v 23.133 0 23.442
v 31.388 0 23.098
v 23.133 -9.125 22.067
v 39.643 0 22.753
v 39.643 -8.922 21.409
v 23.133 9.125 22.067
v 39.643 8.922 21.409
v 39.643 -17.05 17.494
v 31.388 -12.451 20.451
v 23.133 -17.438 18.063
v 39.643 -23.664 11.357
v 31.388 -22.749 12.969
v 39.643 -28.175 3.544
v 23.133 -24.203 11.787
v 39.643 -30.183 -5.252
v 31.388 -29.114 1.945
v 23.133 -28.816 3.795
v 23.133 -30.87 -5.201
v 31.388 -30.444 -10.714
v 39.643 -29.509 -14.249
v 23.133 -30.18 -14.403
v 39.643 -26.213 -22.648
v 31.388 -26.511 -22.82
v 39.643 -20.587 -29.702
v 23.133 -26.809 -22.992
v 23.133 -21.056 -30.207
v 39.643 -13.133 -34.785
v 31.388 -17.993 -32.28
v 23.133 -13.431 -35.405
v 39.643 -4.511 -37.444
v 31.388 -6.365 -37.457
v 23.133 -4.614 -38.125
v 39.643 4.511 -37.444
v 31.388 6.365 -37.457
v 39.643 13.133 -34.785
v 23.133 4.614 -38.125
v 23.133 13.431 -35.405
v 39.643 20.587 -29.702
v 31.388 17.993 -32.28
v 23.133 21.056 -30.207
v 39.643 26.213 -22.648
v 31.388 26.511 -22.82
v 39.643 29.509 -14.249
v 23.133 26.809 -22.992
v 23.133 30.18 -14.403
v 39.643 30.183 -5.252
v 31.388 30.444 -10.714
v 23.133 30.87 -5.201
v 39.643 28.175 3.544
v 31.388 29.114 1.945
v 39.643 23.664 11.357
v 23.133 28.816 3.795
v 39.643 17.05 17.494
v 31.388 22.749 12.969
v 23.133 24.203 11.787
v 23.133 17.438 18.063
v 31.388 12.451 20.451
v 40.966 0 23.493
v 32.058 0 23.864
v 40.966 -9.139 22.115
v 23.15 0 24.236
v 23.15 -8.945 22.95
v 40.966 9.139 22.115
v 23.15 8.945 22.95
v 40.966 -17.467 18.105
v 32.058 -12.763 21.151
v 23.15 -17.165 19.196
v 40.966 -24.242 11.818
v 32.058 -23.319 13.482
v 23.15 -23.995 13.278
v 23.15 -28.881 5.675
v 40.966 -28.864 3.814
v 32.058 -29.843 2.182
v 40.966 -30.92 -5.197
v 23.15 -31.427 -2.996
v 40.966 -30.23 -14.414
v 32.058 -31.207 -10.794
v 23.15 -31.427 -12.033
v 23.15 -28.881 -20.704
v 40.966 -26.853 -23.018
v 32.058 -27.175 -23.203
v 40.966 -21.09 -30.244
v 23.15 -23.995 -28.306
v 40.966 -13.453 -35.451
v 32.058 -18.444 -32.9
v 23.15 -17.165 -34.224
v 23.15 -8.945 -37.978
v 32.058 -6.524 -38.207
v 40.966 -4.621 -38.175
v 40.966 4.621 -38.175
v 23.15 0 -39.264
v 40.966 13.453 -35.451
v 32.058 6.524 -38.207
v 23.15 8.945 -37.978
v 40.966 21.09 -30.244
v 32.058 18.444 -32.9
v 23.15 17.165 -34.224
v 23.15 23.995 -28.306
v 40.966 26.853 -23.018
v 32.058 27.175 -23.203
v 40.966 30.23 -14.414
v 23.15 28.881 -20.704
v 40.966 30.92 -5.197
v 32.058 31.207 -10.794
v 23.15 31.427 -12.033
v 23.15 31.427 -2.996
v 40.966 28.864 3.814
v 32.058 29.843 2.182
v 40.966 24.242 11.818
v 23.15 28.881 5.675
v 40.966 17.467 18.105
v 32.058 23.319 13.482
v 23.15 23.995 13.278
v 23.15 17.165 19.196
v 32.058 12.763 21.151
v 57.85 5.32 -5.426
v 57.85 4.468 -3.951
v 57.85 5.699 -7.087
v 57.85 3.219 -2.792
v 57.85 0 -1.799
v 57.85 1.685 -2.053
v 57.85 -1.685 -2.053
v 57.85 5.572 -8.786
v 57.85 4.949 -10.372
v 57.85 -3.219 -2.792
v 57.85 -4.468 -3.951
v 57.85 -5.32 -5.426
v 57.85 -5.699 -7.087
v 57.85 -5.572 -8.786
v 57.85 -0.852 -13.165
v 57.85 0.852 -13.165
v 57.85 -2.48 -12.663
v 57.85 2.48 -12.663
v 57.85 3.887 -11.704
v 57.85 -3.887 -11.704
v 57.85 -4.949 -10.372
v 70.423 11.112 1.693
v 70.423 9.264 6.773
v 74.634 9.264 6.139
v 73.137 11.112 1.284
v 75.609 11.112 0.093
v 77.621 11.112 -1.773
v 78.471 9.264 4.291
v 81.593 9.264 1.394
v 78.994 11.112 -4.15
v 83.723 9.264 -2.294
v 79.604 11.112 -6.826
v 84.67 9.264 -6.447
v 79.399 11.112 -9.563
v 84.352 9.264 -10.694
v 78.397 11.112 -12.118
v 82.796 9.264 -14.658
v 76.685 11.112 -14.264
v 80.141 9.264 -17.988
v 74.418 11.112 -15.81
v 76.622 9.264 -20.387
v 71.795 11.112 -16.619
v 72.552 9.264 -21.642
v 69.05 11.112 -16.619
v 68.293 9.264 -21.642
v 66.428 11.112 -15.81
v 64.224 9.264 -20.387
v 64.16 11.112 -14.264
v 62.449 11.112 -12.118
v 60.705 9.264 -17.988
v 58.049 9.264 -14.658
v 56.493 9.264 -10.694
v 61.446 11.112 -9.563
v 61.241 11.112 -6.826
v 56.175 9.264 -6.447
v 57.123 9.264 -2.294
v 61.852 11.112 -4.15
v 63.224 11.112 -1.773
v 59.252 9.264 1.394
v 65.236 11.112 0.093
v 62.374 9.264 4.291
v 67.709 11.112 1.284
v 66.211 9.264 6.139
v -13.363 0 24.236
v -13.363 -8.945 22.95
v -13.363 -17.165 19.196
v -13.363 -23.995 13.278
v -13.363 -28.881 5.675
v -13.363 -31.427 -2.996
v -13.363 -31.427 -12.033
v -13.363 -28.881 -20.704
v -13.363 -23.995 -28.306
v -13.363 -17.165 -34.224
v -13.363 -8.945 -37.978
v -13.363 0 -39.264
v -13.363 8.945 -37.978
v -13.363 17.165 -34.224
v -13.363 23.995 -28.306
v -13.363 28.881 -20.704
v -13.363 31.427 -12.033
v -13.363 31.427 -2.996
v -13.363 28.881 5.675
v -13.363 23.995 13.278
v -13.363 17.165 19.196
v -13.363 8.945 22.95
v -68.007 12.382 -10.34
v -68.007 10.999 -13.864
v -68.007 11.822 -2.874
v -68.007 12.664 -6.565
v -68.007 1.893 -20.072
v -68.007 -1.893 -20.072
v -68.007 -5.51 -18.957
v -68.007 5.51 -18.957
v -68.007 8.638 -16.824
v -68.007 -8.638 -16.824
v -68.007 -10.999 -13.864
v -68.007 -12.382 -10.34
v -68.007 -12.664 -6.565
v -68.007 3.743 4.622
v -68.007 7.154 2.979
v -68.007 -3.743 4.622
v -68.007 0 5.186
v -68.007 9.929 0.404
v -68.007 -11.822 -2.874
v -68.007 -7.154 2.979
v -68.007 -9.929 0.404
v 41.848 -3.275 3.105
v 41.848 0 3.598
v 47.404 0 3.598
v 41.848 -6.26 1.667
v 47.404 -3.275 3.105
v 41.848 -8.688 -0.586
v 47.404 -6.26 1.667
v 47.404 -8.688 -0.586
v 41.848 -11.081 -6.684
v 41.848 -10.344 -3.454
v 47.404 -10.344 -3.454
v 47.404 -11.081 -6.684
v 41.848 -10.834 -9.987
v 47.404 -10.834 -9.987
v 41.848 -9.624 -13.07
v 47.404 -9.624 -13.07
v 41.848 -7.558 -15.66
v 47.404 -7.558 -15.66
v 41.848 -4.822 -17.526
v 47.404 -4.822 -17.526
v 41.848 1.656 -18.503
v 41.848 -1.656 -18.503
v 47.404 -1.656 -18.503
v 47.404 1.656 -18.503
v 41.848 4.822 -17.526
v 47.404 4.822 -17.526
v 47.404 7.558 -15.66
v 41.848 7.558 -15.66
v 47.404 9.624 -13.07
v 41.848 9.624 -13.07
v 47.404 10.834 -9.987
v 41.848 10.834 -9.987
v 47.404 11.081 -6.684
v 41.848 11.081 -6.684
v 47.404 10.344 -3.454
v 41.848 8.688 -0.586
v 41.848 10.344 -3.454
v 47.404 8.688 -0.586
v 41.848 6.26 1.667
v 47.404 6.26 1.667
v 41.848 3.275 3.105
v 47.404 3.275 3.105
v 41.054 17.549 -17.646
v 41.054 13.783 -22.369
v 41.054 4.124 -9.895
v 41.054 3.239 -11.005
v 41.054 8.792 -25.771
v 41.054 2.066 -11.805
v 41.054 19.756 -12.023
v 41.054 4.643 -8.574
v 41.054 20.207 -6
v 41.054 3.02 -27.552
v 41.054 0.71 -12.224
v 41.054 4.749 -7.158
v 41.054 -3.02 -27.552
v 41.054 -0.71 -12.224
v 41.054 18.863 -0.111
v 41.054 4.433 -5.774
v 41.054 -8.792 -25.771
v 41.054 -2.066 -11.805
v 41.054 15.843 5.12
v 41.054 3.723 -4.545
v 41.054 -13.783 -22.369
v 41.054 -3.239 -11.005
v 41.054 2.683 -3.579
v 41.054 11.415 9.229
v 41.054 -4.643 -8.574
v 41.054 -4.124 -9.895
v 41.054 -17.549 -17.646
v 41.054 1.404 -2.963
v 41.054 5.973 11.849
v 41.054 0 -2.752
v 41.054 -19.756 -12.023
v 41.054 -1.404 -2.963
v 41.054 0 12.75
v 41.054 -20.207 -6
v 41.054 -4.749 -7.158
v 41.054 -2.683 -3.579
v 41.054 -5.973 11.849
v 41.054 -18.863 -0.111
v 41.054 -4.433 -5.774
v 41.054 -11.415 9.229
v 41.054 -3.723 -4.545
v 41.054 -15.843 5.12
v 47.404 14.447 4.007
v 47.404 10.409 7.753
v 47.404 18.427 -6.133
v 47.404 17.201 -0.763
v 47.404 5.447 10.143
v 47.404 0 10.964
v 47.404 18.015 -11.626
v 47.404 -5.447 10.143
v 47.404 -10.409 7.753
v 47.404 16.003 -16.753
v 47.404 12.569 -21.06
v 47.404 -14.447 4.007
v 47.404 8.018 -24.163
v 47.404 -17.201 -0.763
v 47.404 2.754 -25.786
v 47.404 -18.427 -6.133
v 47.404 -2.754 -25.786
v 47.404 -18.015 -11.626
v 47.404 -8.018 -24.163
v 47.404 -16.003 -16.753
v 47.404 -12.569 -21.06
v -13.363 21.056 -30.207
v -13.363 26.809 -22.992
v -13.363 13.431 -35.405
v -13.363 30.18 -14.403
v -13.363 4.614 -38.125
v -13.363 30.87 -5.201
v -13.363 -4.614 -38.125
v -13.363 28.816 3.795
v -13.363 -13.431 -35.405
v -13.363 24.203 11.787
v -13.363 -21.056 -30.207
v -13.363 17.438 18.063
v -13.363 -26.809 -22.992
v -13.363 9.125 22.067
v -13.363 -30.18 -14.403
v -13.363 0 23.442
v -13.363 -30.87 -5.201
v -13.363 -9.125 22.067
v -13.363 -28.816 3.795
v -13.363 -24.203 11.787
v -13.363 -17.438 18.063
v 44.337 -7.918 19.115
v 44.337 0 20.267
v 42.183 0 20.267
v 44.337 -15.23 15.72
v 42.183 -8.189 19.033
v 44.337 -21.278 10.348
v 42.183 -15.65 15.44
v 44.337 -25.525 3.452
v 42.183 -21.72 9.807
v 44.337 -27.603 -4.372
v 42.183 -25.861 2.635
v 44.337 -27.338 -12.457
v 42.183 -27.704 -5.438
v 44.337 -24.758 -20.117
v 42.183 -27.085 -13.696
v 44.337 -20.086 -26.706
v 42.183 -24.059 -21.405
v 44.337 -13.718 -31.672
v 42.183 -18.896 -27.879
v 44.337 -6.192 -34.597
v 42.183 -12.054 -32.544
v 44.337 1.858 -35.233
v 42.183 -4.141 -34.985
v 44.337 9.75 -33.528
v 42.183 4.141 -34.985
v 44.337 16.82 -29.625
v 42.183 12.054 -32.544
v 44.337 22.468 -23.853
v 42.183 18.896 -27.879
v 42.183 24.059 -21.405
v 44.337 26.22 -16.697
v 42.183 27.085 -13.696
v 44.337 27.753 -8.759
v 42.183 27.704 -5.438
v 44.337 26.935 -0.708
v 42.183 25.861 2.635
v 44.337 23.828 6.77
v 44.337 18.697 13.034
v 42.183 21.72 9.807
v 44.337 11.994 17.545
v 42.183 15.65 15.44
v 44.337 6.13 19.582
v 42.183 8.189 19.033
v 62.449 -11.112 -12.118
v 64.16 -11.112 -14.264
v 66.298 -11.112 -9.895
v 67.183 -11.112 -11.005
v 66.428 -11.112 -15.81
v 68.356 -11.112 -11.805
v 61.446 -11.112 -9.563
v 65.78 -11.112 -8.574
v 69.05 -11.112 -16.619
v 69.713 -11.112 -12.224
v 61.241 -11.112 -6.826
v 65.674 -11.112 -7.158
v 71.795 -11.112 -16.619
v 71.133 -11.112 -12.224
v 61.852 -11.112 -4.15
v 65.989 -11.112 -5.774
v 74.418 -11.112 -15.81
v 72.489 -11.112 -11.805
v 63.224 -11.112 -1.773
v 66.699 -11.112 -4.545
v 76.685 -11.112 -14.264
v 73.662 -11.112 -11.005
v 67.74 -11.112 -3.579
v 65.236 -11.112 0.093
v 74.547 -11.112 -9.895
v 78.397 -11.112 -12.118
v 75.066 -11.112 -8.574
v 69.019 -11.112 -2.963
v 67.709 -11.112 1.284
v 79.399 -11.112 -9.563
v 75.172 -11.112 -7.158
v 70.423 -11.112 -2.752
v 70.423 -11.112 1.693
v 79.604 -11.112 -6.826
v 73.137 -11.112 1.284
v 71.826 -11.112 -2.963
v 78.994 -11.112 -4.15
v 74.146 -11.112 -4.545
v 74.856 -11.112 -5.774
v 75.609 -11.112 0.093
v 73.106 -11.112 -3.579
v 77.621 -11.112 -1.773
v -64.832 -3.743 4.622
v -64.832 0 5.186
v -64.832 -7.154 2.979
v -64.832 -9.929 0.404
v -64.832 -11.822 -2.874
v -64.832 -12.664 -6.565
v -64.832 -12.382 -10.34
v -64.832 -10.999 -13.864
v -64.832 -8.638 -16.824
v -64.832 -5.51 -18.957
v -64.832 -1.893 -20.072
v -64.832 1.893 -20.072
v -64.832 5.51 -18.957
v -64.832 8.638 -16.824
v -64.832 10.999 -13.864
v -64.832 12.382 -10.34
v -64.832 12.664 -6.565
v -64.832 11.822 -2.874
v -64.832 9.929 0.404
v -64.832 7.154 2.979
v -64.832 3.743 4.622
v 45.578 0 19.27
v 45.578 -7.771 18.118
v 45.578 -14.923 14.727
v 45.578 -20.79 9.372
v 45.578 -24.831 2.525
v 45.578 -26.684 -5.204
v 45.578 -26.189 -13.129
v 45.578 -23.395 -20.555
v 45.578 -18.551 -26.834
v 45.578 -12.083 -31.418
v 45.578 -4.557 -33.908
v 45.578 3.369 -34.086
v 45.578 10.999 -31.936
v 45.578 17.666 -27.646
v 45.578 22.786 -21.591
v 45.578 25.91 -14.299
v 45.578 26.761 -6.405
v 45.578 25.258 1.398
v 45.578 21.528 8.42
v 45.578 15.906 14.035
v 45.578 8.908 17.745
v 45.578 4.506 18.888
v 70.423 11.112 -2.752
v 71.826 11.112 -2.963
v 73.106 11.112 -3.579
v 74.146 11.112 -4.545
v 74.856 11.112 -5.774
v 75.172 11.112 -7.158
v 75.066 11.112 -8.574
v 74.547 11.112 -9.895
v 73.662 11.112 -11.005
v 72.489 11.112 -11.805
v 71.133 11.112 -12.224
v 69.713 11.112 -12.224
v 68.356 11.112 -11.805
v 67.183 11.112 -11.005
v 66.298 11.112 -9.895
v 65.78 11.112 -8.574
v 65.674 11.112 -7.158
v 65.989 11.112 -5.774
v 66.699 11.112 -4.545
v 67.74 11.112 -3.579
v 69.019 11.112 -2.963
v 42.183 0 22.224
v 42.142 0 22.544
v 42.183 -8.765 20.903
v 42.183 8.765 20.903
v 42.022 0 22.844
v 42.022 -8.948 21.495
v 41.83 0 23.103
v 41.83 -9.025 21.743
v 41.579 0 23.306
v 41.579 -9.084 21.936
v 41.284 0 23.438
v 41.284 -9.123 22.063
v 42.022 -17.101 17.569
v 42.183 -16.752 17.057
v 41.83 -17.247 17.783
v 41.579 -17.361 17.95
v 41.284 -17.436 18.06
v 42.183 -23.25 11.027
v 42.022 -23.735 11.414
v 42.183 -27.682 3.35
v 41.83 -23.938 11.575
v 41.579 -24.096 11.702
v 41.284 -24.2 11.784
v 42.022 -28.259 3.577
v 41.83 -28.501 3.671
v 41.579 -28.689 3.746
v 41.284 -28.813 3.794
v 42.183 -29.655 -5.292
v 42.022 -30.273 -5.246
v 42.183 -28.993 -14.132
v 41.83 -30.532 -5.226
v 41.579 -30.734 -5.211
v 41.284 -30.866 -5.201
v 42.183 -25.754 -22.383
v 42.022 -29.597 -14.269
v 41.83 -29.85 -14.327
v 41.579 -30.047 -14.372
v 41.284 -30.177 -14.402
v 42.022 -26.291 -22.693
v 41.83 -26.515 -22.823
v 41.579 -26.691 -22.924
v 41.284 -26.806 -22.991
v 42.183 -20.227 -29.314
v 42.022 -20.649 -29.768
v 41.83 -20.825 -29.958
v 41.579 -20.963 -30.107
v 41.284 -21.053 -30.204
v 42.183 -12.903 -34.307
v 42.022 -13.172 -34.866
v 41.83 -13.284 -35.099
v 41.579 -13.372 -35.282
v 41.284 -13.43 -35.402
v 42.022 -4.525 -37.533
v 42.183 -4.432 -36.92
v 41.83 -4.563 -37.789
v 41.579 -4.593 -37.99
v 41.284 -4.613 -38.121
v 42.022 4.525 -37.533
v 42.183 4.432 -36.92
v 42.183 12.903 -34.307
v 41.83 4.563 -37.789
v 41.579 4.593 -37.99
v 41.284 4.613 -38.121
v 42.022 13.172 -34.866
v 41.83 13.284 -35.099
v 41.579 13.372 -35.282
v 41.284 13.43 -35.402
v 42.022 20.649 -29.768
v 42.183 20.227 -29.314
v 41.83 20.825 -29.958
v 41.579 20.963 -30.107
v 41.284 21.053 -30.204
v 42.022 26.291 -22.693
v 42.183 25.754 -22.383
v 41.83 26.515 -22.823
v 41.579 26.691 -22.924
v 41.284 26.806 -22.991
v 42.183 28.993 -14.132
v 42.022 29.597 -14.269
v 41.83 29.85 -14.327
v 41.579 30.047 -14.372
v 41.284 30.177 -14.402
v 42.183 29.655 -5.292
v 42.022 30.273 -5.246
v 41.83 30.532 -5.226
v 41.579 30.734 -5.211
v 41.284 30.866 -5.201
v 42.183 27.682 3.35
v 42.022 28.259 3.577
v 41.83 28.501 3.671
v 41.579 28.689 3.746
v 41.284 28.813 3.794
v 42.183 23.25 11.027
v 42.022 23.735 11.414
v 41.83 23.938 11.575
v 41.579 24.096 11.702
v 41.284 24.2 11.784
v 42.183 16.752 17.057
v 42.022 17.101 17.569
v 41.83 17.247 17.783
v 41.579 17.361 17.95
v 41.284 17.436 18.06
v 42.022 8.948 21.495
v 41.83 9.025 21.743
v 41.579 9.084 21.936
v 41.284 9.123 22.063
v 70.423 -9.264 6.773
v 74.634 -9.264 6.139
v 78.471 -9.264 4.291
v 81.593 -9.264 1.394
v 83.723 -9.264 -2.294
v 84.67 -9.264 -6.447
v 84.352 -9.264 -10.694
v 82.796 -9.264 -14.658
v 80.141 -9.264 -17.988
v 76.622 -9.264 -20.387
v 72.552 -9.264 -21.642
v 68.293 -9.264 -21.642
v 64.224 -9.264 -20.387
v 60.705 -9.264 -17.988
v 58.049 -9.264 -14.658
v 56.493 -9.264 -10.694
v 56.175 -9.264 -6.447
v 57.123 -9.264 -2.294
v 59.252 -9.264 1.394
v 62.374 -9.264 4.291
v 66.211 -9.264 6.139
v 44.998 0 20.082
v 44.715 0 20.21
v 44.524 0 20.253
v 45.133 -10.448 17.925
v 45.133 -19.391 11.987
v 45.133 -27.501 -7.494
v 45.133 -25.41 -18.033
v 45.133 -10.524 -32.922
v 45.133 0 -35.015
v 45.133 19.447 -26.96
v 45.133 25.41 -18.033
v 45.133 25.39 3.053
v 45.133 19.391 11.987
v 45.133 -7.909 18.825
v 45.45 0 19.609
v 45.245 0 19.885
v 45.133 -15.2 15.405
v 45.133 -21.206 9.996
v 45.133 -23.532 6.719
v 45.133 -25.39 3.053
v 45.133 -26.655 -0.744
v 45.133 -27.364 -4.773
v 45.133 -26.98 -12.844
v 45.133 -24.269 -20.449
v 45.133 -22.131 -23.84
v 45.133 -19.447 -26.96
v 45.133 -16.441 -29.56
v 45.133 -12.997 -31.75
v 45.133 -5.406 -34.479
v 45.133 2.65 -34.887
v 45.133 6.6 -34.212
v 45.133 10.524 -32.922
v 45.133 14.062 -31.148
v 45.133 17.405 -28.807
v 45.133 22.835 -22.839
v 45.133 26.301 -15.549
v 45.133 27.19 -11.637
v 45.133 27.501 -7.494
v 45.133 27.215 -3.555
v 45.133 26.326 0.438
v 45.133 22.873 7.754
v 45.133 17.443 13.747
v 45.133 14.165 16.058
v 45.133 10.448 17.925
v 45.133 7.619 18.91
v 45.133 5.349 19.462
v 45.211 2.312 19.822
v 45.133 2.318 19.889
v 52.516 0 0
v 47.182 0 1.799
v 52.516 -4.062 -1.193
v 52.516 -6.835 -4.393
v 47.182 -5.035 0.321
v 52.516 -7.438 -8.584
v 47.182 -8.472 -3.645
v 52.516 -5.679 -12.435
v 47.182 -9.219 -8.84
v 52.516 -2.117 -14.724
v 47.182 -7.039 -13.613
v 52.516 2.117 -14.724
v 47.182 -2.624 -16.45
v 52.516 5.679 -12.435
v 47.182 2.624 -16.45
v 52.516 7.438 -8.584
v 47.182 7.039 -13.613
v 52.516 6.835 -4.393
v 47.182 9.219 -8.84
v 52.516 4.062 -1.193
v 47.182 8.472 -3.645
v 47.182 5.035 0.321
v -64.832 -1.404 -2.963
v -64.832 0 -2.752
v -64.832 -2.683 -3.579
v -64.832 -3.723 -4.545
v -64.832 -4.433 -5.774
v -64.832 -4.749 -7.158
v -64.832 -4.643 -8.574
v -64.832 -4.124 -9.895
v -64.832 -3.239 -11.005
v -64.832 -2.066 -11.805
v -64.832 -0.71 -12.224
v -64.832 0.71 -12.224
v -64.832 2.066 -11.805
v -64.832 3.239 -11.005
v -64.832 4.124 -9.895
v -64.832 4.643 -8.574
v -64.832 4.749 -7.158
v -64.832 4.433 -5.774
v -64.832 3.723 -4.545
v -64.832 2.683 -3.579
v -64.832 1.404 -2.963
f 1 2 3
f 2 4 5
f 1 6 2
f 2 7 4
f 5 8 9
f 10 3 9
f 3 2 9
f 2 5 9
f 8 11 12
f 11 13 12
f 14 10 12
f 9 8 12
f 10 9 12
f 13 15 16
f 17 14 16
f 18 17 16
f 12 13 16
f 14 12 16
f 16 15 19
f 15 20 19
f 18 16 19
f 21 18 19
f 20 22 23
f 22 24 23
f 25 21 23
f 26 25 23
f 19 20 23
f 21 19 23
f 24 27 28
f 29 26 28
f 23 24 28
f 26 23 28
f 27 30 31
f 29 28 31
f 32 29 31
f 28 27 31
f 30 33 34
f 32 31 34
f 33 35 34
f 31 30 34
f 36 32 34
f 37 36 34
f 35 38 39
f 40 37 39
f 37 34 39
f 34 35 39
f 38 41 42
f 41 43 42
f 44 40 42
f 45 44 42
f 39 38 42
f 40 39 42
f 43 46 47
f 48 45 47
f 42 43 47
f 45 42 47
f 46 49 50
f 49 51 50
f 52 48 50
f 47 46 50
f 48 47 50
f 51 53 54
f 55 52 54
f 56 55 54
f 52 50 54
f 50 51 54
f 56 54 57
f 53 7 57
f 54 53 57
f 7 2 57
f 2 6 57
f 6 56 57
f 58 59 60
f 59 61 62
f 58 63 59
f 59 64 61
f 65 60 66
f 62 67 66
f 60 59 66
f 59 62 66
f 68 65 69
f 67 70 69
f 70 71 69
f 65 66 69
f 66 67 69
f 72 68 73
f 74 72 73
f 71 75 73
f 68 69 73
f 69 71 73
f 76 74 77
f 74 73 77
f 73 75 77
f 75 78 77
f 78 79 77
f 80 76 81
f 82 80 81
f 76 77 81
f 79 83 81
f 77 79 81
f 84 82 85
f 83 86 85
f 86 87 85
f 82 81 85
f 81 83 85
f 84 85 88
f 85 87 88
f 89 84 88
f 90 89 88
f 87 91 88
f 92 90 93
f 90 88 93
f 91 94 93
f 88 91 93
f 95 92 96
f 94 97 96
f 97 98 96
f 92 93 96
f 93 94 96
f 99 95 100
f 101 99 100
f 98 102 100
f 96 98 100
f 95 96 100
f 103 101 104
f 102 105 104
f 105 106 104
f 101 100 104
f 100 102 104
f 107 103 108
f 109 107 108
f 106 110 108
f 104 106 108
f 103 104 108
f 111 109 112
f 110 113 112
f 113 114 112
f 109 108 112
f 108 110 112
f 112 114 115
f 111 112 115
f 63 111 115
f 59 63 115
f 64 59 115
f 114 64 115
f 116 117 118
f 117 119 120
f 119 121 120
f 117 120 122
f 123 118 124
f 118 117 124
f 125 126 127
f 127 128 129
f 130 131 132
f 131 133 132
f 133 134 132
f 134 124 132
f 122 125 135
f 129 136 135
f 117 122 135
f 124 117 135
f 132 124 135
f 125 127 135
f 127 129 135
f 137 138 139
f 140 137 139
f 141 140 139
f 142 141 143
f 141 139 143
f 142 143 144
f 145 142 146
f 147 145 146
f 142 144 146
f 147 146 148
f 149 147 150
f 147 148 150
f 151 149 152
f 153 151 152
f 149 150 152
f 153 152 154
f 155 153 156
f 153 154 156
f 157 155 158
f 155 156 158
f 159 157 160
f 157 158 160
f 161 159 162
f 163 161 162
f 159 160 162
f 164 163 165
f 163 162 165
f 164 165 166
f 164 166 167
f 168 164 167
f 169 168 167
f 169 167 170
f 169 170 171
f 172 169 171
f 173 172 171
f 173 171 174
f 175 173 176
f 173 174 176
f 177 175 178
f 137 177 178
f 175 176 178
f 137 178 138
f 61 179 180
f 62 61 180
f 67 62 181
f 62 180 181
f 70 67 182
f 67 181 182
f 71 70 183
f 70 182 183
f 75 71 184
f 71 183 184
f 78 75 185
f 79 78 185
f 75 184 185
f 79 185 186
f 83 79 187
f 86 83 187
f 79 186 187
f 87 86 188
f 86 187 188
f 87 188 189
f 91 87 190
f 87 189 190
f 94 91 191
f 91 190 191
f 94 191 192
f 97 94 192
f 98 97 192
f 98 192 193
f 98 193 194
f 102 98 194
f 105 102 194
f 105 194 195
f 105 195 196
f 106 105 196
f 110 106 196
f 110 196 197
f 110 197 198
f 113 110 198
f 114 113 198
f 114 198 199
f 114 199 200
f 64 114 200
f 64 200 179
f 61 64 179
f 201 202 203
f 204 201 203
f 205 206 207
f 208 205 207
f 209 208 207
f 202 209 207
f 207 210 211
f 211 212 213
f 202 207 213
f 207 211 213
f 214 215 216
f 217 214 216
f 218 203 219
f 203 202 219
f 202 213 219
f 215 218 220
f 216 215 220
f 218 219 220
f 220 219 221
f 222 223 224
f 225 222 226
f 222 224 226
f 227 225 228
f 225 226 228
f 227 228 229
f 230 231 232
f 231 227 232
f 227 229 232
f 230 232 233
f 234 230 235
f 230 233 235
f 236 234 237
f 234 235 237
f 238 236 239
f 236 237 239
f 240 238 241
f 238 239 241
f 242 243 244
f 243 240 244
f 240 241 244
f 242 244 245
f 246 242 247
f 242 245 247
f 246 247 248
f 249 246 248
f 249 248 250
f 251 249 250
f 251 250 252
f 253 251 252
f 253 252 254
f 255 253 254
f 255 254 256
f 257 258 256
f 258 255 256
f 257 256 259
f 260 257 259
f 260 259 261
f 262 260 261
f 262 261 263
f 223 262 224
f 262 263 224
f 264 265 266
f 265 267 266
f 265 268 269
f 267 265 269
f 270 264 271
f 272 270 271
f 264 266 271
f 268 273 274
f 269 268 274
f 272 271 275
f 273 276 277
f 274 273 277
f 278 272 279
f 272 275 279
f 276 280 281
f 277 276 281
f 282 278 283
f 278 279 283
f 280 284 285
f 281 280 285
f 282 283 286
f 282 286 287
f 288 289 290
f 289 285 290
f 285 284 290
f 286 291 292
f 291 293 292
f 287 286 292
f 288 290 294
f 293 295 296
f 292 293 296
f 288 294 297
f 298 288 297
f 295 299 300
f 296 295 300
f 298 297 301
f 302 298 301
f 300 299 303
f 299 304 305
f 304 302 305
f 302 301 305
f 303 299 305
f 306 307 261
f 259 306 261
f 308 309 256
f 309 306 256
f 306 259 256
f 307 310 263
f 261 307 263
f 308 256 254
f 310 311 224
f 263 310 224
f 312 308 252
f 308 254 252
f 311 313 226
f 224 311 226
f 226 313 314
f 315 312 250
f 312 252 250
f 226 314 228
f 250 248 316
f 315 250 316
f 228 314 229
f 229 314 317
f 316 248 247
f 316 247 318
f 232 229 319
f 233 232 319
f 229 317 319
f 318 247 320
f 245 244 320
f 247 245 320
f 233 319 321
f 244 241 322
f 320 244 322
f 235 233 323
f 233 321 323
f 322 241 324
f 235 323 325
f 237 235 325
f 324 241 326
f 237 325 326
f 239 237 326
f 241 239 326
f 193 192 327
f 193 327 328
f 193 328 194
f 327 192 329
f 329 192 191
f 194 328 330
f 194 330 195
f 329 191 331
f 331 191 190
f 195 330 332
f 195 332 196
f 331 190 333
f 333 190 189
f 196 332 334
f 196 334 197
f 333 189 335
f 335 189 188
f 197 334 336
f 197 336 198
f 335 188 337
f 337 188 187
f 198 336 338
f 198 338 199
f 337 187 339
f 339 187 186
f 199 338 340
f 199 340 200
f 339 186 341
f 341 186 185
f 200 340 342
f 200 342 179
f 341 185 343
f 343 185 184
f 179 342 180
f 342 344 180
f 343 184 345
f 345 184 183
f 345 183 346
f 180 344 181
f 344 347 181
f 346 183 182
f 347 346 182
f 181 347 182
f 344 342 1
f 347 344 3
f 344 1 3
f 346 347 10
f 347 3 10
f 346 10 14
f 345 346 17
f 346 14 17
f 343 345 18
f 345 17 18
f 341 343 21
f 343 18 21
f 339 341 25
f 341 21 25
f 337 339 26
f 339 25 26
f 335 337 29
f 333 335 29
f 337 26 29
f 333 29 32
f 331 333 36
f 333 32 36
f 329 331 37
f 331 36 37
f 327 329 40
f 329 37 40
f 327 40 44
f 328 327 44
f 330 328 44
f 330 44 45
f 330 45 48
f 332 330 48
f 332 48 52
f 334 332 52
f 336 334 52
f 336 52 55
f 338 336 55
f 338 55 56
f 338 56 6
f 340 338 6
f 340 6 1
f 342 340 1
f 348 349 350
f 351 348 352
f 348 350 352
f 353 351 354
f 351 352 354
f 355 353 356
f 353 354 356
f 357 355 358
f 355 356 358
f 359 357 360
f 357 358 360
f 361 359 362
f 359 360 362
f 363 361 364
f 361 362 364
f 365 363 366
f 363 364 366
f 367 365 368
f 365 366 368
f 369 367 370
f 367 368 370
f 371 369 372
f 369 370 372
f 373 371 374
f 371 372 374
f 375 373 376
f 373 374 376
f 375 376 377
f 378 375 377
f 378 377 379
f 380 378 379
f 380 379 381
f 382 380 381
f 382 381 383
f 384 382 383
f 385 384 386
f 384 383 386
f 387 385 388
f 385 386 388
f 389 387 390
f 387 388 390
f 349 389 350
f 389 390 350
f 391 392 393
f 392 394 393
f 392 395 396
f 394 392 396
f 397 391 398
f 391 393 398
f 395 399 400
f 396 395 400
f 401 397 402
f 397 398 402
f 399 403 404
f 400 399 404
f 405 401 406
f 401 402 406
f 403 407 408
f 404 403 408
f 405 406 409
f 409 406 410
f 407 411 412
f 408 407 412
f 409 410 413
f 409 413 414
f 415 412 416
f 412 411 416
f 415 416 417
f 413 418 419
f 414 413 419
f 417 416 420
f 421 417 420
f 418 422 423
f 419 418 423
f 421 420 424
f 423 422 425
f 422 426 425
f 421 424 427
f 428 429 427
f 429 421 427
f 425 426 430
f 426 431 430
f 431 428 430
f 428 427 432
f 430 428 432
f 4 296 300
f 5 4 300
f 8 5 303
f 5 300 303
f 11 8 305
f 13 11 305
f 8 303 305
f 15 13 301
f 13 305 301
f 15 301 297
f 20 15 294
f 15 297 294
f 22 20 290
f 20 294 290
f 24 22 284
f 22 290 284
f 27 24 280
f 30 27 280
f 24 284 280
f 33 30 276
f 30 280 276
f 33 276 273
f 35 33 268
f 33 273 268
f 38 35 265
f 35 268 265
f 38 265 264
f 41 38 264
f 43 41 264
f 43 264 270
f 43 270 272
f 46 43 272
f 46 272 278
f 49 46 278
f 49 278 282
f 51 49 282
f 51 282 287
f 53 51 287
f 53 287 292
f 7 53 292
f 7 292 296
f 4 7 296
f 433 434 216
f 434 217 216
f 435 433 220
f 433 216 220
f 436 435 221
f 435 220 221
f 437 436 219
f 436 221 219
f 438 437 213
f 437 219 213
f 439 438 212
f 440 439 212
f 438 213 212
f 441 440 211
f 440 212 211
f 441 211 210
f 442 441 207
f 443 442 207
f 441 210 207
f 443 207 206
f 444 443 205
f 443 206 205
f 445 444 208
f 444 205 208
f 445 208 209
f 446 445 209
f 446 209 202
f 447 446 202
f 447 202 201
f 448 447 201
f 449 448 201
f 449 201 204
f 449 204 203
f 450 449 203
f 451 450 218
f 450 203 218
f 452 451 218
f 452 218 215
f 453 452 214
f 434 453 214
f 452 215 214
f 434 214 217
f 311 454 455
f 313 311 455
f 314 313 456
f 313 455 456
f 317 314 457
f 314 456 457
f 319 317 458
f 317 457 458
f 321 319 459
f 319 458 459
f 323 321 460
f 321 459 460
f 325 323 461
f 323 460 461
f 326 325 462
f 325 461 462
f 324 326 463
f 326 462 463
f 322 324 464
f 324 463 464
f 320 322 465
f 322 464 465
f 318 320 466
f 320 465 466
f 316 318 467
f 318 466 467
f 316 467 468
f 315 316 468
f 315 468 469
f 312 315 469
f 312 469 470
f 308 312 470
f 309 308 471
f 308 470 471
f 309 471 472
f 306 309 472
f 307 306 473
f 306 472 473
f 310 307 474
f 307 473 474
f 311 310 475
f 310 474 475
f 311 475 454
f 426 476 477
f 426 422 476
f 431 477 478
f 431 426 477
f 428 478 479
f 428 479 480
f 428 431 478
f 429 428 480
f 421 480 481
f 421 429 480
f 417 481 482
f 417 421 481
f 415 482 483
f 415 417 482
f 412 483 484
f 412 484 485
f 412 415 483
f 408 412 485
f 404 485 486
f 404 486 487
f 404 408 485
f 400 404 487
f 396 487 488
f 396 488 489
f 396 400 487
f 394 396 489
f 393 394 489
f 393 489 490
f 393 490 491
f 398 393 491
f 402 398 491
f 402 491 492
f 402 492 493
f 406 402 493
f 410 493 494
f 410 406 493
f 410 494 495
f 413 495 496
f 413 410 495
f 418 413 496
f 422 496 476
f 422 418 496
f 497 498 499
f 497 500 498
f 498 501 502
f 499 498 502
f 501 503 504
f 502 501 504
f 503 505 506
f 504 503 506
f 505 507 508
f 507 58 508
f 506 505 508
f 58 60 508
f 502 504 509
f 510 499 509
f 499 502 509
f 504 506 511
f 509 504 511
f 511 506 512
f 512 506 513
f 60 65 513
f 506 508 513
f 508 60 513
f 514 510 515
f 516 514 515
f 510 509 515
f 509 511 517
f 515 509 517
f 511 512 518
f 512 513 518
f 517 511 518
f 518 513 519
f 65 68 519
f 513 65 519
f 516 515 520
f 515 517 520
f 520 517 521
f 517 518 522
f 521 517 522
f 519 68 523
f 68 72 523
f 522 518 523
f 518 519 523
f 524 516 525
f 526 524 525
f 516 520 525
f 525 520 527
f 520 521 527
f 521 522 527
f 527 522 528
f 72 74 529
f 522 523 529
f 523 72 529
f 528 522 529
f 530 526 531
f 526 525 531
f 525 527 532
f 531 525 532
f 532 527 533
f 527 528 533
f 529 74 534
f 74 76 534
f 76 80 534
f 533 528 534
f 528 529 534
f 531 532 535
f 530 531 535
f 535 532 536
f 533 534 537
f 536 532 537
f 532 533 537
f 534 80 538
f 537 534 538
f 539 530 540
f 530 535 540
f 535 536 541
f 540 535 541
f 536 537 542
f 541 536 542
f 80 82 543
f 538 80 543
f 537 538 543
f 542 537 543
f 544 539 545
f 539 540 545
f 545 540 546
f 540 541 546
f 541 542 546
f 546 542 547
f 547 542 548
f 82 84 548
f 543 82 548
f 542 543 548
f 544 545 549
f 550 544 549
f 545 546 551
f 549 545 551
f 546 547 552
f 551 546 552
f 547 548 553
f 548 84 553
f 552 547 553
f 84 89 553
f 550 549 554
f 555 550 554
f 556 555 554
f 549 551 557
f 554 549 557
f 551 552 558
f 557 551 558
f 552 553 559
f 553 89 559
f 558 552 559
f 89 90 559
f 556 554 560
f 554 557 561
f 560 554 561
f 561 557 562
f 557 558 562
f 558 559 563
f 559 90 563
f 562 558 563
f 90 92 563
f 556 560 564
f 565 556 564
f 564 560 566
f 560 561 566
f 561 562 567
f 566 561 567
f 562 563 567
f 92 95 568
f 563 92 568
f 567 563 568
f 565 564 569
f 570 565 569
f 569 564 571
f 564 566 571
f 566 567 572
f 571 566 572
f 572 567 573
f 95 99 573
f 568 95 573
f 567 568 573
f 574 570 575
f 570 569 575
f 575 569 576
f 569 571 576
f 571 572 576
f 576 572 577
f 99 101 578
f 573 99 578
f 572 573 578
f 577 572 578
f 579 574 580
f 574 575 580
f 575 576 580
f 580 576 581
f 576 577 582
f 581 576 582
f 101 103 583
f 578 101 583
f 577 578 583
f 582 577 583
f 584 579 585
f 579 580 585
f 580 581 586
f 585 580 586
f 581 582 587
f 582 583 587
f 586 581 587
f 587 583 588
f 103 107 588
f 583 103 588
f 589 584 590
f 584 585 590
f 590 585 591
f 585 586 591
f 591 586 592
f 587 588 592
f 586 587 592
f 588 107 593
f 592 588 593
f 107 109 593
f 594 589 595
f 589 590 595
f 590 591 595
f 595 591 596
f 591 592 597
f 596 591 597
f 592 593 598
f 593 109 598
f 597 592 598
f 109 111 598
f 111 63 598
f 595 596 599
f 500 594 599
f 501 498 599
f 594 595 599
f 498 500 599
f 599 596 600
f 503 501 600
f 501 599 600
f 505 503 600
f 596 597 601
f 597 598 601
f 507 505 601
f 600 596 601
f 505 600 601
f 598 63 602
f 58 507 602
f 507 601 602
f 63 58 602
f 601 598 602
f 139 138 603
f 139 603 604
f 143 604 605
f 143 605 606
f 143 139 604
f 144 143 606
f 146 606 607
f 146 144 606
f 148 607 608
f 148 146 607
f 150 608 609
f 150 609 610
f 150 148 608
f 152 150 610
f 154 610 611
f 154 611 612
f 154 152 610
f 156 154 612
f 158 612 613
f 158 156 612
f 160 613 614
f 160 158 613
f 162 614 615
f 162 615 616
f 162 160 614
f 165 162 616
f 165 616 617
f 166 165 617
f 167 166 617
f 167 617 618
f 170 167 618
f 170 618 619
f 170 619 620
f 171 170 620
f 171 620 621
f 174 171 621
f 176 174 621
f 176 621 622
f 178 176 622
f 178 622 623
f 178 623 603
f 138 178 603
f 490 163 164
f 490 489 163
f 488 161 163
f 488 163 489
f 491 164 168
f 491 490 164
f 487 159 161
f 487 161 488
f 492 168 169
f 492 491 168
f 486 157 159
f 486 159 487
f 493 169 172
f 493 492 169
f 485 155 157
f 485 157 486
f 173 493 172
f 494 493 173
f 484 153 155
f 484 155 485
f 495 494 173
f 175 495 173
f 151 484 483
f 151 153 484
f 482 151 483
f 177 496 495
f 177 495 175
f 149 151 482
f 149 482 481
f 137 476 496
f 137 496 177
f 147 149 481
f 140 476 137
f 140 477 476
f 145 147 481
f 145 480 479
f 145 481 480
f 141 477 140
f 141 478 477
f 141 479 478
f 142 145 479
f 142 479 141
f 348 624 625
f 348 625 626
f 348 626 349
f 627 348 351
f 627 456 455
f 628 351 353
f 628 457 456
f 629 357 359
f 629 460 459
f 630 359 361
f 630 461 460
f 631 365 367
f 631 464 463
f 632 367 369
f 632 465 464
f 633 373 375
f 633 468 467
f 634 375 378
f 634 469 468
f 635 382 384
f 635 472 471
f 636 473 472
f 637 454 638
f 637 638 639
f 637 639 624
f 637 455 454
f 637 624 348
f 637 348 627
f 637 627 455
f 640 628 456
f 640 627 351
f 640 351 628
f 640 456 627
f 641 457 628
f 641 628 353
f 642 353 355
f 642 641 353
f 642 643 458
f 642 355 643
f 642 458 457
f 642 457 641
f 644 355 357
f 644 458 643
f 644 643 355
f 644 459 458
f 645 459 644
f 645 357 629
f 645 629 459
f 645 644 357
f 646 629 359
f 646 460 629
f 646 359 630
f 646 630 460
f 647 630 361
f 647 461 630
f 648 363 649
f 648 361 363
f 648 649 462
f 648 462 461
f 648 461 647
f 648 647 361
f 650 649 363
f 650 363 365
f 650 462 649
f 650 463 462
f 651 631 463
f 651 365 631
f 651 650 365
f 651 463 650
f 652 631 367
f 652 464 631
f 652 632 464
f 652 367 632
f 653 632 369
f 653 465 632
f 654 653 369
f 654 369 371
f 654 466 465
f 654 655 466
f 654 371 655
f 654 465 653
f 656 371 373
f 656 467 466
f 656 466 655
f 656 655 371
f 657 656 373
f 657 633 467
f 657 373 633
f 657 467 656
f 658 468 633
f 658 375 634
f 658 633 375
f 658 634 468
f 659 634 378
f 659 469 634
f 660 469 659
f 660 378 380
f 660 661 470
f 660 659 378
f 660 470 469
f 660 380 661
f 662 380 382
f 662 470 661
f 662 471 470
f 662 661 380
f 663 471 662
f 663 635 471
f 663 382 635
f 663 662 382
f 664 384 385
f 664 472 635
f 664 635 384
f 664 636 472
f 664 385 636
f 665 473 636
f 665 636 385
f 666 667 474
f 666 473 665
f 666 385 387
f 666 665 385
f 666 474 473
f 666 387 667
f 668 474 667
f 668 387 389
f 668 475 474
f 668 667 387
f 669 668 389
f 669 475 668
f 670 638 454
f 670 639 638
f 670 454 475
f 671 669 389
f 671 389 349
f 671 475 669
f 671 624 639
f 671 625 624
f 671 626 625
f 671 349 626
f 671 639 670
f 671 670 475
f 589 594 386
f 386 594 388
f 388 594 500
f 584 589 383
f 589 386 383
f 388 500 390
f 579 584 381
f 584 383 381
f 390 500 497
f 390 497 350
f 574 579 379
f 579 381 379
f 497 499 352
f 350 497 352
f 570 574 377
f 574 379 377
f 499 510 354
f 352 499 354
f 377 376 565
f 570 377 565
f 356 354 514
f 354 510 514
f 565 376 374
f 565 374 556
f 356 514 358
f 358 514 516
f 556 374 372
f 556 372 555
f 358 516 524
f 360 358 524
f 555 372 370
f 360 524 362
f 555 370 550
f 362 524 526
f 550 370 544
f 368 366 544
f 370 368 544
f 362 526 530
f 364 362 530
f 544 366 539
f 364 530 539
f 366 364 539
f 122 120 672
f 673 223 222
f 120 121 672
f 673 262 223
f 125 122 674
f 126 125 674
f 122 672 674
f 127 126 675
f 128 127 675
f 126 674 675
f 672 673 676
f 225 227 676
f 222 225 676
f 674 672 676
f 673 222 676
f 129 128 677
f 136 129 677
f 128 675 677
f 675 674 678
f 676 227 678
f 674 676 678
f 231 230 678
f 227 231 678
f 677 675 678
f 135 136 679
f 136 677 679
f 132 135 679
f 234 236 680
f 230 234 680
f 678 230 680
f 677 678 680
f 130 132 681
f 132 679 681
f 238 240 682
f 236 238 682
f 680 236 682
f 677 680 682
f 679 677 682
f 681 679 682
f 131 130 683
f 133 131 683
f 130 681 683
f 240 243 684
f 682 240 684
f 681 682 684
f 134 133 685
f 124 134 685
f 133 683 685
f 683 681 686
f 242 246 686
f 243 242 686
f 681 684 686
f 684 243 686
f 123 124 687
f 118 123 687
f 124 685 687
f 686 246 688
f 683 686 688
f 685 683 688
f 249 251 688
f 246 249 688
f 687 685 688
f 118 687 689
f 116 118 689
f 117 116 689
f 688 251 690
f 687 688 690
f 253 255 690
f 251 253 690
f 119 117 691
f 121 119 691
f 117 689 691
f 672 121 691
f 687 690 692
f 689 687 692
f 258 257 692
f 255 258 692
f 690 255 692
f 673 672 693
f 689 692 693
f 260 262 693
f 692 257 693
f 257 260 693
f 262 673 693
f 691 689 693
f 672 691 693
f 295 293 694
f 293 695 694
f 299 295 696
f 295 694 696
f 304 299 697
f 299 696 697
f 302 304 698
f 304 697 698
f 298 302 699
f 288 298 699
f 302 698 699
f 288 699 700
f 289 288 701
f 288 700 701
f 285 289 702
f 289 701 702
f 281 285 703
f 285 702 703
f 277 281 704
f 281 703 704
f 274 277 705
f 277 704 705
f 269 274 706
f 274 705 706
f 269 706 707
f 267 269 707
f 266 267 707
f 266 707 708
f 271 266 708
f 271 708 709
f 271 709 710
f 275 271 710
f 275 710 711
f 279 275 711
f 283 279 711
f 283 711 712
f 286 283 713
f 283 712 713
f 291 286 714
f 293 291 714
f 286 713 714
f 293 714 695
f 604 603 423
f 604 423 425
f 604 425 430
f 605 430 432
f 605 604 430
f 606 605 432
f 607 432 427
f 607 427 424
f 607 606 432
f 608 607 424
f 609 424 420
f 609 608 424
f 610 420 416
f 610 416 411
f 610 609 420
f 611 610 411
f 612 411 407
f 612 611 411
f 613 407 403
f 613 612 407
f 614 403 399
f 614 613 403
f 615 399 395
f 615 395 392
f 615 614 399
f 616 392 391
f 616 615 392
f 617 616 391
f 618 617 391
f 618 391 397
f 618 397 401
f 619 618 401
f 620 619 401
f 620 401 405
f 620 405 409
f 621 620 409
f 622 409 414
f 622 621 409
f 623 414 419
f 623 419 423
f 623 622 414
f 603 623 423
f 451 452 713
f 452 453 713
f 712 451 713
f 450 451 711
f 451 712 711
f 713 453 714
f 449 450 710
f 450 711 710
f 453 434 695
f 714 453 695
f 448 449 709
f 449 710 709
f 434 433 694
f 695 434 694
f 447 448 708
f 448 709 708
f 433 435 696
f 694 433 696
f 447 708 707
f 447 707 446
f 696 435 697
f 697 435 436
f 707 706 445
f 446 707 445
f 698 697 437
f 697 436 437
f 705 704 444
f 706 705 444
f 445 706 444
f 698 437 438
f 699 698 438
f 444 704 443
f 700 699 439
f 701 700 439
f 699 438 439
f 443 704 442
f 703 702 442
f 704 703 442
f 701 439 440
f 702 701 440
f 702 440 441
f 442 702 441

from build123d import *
from OCP.BRepFilletAPI import BRepFilletAPI_MakeChamfer

# Parameters (mm, degrees)
SKETCH2_R           = 14.2875
SKETCH2_R_2         = 4.7625
BOSS_EXTRUDE1_DEPTH = 11.1125
CHAMFER1_SIZE       = 5.08
CHAMFER1_SIZE2      = 1.84896879
FILLET1_R           = 1.27


with BuildPart() as part:
    # Sketch1 → Revolve1 (revolve)
    with BuildSketch(Plane(origin=(0, 0, 0), x_dir=(1, 0, 0), z_dir=(0, 1, 0)), mode=Mode.PRIVATE) as revolve1_sk:
        Polygon((-68.007276158, 20.214239498), (-68.007276158, 7.514239498), (57.849723842, 7.514239498), (57.849723842, 13.229239498), (41.847723842, 18.626739498), (41.847723842, 12.276739498), (-64.832276158, 12.276739498), (-64.832276158, 20.214239498), align=None)
    revolve(revolve1_sk.sketch.rotate(Axis((-68.007276158, 0, -7.514239498), (1, 0, 0)), 180), axis=Axis((-68.007276158, 0, -7.514239498), (1, 0, 0)))

    # Sketch3 → Revolve2 (revolve)
    with BuildSketch(Plane(origin=(0, 0, 0), x_dir=(1, 0, 0), z_dir=(0, 1, 0)), mode=Mode.PRIVATE) as revolve2_sk:
        Polygon((41.847723842, 12.276739498), (41.847723842, 18.626739498), (47.403973842, 18.626739498), (47.403973842, 25.992739498), (45.358376756, 35.295489498), (42.183376756, 35.295489498), (42.183376756, 38.470489498), (23.149920398, 39.264239498), (-13.362579602, 39.264239498), (-13.362579602, 38.470489498), (23.133376756, 38.470489498), (39.643376756, 37.781974903), (41.053973842, 27.778209953), (41.053973842, 12.276739498), align=None)
        Polygon((41.053973842, 2.751739498), (41.847723842, 2.751739498), (41.847723842, -3.598260502), (47.403973842, -3.598260502), (47.403973842, -10.964260502), (45.358376756, -20.267010502), (42.183376756, -20.267010502), (42.183376756, -23.442010502), (23.149920398, -24.235760502), (-13.362579602, -24.235760502), (-13.362579602, -23.442010502), (23.133376756, -23.442010502), (39.643376756, -22.753495907), (41.053973842, -12.749730957), align=None)
    revolve(revolve2_sk.sketch.rotate(Axis((-68.086651194, 0, -7.514239498), (1, 0, 0)), 180), axis=Axis((-68.086651194, 0, -7.514239498), (1, 0, 0)))

    # Fillet1
    fillet1_edges = [part.edges().sort_by_distance(p)[0] for p in [
        (45.358376756, 0, -35.295489498),
        (42.183376756, 0, -38.470489498),
        (23.149920398, 0, -39.264239498),
    ]]
    fillet(fillet1_edges, radius=FILLET1_R)


with BuildPart() as body_2:
    # Sketch2 → Boss-Extrude1 (new, symmetric)
    with BuildSketch(Plane(origin=(0, 0, 0), x_dir=(1, 0, 0), z_dir=(0, 1, 0))):
        with Locations(Location((70.422723842, 7.514239498, 0), (0, 0, 270))):
            Circle(SKETCH2_R)
        with Locations(Location((70.422723842, 7.514239498, 0), (0, 0, 270))):
            Circle(SKETCH2_R_2, mode=Mode.SUBTRACT)
    extrude(amount=BOSS_EXTRUDE1_DEPTH, both=True)

    # Chamfer1: one chamfer whose edges measure the first distance from different faces: ONE call of the kernel's chamfer builder (chamfer() names one face for all edges)
    chamfer1_edges_1 = [body_2.edges().sort_by_distance(p)[0] for p in [
        (70.422723842, -11.1125, -21.801739498),
    ]]
    chamfer1_side_1 = [body_2.faces().sort_by_distance(p)[0] for p in [
        (70.422723842, -11.1125, -21.397627972),
    ]]
    chamfer1_edges_2 = [body_2.edges().sort_by_distance(p)[0] for p in [
        (70.422723842, 11.1125, -21.801739498),
    ]]
    chamfer1_side_2 = [body_2.faces().sort_by_distance(p)[0] for p in [
        (70.422723842, 11.1125, -21.397627972),
    ]]
    chamfer1 = BRepFilletAPI_MakeChamfer(body_2.part.solid().wrapped)
    for e in chamfer1_edges_1:
        chamfer1.Add(CHAMFER1_SIZE, CHAMFER1_SIZE2, e.wrapped, chamfer1_side_1[0].wrapped)  # the first distance lies on this face
    for e in chamfer1_edges_2:
        chamfer1.Add(CHAMFER1_SIZE, CHAMFER1_SIZE2, e.wrapped, chamfer1_side_2[0].wrapped)  # the first distance lies on this face
    add(Compound.cast(chamfer1.Shape()), mode=Mode.REPLACE)


solid = Compound([part.part, body_2.part])
